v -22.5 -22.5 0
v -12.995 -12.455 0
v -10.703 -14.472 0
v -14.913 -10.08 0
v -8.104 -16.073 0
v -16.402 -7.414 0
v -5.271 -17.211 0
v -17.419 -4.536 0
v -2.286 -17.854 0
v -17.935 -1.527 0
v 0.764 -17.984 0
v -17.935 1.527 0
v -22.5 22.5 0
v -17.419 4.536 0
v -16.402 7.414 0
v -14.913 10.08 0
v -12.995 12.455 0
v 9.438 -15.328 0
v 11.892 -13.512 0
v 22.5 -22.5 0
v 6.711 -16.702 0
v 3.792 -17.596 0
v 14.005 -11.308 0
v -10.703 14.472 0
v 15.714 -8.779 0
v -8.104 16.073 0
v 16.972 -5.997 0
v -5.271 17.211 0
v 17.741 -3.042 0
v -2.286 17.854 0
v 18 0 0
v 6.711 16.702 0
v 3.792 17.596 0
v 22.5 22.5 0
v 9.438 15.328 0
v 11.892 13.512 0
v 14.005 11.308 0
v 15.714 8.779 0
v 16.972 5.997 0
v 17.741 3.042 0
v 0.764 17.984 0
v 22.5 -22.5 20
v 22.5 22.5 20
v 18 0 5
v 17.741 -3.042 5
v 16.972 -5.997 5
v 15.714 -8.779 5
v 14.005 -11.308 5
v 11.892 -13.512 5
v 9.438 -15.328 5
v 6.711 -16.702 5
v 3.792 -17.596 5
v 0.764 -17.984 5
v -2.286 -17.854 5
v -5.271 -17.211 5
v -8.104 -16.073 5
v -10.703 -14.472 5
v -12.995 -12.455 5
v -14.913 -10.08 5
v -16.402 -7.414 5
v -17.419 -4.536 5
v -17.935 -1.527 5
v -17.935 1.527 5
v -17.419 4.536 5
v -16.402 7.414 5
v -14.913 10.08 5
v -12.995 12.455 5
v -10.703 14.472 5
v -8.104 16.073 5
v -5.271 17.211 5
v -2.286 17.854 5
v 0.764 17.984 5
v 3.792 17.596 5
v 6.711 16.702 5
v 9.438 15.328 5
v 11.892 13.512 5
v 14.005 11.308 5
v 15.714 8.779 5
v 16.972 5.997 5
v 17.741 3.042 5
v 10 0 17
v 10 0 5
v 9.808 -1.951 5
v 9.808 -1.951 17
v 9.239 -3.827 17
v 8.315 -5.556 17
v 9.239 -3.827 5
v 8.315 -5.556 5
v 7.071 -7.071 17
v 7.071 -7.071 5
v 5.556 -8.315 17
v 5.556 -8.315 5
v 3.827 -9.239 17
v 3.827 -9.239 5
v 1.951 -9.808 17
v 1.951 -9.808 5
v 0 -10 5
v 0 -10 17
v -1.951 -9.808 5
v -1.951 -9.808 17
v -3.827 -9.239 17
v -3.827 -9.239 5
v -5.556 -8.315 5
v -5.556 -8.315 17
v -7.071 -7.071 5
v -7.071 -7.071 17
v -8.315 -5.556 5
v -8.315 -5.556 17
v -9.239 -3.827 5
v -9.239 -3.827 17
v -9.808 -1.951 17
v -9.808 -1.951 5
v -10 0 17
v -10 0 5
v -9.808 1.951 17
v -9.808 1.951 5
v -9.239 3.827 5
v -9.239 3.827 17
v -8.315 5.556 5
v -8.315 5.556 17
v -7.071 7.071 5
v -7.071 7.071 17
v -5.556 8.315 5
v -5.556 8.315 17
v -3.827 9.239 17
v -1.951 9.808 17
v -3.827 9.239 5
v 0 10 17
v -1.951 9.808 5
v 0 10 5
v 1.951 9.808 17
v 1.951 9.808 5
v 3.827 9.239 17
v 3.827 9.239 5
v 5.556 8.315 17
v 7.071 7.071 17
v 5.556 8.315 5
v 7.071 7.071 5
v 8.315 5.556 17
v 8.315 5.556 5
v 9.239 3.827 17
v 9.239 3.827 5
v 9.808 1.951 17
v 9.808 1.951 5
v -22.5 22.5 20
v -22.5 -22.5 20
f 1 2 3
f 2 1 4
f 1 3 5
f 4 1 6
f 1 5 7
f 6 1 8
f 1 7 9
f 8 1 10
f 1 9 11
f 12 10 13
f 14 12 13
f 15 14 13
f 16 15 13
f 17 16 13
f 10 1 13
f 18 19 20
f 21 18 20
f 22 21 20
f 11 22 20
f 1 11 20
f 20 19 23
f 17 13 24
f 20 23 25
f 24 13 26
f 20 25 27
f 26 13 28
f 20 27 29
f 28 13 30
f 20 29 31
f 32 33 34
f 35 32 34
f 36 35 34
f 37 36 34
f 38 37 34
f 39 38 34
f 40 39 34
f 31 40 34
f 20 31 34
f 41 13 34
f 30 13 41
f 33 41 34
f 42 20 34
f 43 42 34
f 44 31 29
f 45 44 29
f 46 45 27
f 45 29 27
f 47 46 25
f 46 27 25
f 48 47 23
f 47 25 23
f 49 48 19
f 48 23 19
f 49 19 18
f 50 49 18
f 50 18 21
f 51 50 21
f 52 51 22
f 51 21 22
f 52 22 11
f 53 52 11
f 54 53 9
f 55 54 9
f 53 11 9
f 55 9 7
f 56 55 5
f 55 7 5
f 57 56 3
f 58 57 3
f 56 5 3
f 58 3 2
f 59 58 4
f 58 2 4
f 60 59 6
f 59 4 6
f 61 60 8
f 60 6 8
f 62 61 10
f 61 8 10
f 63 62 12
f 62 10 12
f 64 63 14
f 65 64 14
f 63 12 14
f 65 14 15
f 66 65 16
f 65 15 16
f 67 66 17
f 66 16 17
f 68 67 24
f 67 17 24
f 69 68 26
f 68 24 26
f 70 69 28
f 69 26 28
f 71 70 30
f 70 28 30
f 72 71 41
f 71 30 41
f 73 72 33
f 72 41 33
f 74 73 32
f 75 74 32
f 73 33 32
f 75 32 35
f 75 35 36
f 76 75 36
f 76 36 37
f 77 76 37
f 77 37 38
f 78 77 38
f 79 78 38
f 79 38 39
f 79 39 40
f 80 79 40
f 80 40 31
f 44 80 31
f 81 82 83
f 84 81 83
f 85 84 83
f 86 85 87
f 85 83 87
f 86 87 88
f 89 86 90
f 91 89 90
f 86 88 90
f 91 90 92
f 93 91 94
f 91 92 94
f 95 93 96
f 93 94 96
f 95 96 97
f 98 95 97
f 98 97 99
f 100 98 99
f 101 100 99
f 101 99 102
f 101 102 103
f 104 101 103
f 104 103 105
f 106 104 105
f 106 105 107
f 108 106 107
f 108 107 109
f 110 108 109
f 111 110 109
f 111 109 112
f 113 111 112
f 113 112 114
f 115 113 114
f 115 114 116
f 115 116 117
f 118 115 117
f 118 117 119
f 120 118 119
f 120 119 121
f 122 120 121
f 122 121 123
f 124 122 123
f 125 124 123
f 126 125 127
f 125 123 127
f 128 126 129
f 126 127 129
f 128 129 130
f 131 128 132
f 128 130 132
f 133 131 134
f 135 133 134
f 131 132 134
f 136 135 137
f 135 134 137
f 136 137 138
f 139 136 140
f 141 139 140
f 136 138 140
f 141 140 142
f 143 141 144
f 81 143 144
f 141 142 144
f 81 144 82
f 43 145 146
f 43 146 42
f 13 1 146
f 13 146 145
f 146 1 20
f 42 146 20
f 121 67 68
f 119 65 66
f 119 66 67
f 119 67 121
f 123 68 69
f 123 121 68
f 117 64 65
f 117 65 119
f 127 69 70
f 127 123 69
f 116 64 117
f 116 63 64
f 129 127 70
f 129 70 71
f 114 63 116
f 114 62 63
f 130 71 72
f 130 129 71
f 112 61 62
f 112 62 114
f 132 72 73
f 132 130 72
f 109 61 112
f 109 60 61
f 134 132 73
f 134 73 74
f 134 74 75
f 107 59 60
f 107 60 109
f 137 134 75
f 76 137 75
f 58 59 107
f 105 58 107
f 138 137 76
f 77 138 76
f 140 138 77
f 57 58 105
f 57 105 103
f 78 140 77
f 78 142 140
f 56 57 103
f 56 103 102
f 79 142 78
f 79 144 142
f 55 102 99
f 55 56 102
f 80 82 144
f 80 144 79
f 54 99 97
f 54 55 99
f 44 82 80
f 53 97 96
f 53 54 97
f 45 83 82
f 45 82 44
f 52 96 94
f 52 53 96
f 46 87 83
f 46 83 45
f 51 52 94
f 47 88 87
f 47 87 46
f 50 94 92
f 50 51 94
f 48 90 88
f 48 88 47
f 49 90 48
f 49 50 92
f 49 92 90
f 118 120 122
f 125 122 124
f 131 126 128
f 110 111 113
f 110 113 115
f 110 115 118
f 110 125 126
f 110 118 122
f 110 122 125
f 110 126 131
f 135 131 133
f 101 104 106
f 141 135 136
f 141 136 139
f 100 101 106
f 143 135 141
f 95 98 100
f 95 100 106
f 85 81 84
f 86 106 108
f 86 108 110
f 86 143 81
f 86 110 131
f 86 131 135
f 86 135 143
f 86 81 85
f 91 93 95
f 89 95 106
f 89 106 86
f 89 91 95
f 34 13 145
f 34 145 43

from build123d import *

# Parameters (mm, degrees)
F0_W     = 45
F0_H     = 45
F1_DEPTH = 20
F2_R     = 10
F4_DEPTH = 17
F3_R     = 18
F3_R_2   = 10
F5_DEPTH = 5


with BuildPart() as f1:
    # F0 (on Top) → F1 (new body)
    with BuildSketch(Plane.XY):
        Rectangle(F0_W, F0_H)
    extrude(amount=F1_DEPTH)

    # F2 (on face) → F4 (cut)
    with BuildSketch(Plane(origin=(0, 0, 0), x_dir=(1, 0, 0), z_dir=(0, 0, -1))):
        Circle(F2_R)
    extrude(amount=-F4_DEPTH, mode=Mode.SUBTRACT)

    # F3 (on face) → F5 (cut)
    with BuildSketch(Plane(origin=(0, 0, 0), x_dir=(1, 0, 0), z_dir=(0, 0, -1))):
        Circle(F3_R)
        Circle(F3_R_2, mode=Mode.SUBTRACT)
    extrude(amount=-F5_DEPTH, mode=Mode.SUBTRACT)


solid = f1.part
